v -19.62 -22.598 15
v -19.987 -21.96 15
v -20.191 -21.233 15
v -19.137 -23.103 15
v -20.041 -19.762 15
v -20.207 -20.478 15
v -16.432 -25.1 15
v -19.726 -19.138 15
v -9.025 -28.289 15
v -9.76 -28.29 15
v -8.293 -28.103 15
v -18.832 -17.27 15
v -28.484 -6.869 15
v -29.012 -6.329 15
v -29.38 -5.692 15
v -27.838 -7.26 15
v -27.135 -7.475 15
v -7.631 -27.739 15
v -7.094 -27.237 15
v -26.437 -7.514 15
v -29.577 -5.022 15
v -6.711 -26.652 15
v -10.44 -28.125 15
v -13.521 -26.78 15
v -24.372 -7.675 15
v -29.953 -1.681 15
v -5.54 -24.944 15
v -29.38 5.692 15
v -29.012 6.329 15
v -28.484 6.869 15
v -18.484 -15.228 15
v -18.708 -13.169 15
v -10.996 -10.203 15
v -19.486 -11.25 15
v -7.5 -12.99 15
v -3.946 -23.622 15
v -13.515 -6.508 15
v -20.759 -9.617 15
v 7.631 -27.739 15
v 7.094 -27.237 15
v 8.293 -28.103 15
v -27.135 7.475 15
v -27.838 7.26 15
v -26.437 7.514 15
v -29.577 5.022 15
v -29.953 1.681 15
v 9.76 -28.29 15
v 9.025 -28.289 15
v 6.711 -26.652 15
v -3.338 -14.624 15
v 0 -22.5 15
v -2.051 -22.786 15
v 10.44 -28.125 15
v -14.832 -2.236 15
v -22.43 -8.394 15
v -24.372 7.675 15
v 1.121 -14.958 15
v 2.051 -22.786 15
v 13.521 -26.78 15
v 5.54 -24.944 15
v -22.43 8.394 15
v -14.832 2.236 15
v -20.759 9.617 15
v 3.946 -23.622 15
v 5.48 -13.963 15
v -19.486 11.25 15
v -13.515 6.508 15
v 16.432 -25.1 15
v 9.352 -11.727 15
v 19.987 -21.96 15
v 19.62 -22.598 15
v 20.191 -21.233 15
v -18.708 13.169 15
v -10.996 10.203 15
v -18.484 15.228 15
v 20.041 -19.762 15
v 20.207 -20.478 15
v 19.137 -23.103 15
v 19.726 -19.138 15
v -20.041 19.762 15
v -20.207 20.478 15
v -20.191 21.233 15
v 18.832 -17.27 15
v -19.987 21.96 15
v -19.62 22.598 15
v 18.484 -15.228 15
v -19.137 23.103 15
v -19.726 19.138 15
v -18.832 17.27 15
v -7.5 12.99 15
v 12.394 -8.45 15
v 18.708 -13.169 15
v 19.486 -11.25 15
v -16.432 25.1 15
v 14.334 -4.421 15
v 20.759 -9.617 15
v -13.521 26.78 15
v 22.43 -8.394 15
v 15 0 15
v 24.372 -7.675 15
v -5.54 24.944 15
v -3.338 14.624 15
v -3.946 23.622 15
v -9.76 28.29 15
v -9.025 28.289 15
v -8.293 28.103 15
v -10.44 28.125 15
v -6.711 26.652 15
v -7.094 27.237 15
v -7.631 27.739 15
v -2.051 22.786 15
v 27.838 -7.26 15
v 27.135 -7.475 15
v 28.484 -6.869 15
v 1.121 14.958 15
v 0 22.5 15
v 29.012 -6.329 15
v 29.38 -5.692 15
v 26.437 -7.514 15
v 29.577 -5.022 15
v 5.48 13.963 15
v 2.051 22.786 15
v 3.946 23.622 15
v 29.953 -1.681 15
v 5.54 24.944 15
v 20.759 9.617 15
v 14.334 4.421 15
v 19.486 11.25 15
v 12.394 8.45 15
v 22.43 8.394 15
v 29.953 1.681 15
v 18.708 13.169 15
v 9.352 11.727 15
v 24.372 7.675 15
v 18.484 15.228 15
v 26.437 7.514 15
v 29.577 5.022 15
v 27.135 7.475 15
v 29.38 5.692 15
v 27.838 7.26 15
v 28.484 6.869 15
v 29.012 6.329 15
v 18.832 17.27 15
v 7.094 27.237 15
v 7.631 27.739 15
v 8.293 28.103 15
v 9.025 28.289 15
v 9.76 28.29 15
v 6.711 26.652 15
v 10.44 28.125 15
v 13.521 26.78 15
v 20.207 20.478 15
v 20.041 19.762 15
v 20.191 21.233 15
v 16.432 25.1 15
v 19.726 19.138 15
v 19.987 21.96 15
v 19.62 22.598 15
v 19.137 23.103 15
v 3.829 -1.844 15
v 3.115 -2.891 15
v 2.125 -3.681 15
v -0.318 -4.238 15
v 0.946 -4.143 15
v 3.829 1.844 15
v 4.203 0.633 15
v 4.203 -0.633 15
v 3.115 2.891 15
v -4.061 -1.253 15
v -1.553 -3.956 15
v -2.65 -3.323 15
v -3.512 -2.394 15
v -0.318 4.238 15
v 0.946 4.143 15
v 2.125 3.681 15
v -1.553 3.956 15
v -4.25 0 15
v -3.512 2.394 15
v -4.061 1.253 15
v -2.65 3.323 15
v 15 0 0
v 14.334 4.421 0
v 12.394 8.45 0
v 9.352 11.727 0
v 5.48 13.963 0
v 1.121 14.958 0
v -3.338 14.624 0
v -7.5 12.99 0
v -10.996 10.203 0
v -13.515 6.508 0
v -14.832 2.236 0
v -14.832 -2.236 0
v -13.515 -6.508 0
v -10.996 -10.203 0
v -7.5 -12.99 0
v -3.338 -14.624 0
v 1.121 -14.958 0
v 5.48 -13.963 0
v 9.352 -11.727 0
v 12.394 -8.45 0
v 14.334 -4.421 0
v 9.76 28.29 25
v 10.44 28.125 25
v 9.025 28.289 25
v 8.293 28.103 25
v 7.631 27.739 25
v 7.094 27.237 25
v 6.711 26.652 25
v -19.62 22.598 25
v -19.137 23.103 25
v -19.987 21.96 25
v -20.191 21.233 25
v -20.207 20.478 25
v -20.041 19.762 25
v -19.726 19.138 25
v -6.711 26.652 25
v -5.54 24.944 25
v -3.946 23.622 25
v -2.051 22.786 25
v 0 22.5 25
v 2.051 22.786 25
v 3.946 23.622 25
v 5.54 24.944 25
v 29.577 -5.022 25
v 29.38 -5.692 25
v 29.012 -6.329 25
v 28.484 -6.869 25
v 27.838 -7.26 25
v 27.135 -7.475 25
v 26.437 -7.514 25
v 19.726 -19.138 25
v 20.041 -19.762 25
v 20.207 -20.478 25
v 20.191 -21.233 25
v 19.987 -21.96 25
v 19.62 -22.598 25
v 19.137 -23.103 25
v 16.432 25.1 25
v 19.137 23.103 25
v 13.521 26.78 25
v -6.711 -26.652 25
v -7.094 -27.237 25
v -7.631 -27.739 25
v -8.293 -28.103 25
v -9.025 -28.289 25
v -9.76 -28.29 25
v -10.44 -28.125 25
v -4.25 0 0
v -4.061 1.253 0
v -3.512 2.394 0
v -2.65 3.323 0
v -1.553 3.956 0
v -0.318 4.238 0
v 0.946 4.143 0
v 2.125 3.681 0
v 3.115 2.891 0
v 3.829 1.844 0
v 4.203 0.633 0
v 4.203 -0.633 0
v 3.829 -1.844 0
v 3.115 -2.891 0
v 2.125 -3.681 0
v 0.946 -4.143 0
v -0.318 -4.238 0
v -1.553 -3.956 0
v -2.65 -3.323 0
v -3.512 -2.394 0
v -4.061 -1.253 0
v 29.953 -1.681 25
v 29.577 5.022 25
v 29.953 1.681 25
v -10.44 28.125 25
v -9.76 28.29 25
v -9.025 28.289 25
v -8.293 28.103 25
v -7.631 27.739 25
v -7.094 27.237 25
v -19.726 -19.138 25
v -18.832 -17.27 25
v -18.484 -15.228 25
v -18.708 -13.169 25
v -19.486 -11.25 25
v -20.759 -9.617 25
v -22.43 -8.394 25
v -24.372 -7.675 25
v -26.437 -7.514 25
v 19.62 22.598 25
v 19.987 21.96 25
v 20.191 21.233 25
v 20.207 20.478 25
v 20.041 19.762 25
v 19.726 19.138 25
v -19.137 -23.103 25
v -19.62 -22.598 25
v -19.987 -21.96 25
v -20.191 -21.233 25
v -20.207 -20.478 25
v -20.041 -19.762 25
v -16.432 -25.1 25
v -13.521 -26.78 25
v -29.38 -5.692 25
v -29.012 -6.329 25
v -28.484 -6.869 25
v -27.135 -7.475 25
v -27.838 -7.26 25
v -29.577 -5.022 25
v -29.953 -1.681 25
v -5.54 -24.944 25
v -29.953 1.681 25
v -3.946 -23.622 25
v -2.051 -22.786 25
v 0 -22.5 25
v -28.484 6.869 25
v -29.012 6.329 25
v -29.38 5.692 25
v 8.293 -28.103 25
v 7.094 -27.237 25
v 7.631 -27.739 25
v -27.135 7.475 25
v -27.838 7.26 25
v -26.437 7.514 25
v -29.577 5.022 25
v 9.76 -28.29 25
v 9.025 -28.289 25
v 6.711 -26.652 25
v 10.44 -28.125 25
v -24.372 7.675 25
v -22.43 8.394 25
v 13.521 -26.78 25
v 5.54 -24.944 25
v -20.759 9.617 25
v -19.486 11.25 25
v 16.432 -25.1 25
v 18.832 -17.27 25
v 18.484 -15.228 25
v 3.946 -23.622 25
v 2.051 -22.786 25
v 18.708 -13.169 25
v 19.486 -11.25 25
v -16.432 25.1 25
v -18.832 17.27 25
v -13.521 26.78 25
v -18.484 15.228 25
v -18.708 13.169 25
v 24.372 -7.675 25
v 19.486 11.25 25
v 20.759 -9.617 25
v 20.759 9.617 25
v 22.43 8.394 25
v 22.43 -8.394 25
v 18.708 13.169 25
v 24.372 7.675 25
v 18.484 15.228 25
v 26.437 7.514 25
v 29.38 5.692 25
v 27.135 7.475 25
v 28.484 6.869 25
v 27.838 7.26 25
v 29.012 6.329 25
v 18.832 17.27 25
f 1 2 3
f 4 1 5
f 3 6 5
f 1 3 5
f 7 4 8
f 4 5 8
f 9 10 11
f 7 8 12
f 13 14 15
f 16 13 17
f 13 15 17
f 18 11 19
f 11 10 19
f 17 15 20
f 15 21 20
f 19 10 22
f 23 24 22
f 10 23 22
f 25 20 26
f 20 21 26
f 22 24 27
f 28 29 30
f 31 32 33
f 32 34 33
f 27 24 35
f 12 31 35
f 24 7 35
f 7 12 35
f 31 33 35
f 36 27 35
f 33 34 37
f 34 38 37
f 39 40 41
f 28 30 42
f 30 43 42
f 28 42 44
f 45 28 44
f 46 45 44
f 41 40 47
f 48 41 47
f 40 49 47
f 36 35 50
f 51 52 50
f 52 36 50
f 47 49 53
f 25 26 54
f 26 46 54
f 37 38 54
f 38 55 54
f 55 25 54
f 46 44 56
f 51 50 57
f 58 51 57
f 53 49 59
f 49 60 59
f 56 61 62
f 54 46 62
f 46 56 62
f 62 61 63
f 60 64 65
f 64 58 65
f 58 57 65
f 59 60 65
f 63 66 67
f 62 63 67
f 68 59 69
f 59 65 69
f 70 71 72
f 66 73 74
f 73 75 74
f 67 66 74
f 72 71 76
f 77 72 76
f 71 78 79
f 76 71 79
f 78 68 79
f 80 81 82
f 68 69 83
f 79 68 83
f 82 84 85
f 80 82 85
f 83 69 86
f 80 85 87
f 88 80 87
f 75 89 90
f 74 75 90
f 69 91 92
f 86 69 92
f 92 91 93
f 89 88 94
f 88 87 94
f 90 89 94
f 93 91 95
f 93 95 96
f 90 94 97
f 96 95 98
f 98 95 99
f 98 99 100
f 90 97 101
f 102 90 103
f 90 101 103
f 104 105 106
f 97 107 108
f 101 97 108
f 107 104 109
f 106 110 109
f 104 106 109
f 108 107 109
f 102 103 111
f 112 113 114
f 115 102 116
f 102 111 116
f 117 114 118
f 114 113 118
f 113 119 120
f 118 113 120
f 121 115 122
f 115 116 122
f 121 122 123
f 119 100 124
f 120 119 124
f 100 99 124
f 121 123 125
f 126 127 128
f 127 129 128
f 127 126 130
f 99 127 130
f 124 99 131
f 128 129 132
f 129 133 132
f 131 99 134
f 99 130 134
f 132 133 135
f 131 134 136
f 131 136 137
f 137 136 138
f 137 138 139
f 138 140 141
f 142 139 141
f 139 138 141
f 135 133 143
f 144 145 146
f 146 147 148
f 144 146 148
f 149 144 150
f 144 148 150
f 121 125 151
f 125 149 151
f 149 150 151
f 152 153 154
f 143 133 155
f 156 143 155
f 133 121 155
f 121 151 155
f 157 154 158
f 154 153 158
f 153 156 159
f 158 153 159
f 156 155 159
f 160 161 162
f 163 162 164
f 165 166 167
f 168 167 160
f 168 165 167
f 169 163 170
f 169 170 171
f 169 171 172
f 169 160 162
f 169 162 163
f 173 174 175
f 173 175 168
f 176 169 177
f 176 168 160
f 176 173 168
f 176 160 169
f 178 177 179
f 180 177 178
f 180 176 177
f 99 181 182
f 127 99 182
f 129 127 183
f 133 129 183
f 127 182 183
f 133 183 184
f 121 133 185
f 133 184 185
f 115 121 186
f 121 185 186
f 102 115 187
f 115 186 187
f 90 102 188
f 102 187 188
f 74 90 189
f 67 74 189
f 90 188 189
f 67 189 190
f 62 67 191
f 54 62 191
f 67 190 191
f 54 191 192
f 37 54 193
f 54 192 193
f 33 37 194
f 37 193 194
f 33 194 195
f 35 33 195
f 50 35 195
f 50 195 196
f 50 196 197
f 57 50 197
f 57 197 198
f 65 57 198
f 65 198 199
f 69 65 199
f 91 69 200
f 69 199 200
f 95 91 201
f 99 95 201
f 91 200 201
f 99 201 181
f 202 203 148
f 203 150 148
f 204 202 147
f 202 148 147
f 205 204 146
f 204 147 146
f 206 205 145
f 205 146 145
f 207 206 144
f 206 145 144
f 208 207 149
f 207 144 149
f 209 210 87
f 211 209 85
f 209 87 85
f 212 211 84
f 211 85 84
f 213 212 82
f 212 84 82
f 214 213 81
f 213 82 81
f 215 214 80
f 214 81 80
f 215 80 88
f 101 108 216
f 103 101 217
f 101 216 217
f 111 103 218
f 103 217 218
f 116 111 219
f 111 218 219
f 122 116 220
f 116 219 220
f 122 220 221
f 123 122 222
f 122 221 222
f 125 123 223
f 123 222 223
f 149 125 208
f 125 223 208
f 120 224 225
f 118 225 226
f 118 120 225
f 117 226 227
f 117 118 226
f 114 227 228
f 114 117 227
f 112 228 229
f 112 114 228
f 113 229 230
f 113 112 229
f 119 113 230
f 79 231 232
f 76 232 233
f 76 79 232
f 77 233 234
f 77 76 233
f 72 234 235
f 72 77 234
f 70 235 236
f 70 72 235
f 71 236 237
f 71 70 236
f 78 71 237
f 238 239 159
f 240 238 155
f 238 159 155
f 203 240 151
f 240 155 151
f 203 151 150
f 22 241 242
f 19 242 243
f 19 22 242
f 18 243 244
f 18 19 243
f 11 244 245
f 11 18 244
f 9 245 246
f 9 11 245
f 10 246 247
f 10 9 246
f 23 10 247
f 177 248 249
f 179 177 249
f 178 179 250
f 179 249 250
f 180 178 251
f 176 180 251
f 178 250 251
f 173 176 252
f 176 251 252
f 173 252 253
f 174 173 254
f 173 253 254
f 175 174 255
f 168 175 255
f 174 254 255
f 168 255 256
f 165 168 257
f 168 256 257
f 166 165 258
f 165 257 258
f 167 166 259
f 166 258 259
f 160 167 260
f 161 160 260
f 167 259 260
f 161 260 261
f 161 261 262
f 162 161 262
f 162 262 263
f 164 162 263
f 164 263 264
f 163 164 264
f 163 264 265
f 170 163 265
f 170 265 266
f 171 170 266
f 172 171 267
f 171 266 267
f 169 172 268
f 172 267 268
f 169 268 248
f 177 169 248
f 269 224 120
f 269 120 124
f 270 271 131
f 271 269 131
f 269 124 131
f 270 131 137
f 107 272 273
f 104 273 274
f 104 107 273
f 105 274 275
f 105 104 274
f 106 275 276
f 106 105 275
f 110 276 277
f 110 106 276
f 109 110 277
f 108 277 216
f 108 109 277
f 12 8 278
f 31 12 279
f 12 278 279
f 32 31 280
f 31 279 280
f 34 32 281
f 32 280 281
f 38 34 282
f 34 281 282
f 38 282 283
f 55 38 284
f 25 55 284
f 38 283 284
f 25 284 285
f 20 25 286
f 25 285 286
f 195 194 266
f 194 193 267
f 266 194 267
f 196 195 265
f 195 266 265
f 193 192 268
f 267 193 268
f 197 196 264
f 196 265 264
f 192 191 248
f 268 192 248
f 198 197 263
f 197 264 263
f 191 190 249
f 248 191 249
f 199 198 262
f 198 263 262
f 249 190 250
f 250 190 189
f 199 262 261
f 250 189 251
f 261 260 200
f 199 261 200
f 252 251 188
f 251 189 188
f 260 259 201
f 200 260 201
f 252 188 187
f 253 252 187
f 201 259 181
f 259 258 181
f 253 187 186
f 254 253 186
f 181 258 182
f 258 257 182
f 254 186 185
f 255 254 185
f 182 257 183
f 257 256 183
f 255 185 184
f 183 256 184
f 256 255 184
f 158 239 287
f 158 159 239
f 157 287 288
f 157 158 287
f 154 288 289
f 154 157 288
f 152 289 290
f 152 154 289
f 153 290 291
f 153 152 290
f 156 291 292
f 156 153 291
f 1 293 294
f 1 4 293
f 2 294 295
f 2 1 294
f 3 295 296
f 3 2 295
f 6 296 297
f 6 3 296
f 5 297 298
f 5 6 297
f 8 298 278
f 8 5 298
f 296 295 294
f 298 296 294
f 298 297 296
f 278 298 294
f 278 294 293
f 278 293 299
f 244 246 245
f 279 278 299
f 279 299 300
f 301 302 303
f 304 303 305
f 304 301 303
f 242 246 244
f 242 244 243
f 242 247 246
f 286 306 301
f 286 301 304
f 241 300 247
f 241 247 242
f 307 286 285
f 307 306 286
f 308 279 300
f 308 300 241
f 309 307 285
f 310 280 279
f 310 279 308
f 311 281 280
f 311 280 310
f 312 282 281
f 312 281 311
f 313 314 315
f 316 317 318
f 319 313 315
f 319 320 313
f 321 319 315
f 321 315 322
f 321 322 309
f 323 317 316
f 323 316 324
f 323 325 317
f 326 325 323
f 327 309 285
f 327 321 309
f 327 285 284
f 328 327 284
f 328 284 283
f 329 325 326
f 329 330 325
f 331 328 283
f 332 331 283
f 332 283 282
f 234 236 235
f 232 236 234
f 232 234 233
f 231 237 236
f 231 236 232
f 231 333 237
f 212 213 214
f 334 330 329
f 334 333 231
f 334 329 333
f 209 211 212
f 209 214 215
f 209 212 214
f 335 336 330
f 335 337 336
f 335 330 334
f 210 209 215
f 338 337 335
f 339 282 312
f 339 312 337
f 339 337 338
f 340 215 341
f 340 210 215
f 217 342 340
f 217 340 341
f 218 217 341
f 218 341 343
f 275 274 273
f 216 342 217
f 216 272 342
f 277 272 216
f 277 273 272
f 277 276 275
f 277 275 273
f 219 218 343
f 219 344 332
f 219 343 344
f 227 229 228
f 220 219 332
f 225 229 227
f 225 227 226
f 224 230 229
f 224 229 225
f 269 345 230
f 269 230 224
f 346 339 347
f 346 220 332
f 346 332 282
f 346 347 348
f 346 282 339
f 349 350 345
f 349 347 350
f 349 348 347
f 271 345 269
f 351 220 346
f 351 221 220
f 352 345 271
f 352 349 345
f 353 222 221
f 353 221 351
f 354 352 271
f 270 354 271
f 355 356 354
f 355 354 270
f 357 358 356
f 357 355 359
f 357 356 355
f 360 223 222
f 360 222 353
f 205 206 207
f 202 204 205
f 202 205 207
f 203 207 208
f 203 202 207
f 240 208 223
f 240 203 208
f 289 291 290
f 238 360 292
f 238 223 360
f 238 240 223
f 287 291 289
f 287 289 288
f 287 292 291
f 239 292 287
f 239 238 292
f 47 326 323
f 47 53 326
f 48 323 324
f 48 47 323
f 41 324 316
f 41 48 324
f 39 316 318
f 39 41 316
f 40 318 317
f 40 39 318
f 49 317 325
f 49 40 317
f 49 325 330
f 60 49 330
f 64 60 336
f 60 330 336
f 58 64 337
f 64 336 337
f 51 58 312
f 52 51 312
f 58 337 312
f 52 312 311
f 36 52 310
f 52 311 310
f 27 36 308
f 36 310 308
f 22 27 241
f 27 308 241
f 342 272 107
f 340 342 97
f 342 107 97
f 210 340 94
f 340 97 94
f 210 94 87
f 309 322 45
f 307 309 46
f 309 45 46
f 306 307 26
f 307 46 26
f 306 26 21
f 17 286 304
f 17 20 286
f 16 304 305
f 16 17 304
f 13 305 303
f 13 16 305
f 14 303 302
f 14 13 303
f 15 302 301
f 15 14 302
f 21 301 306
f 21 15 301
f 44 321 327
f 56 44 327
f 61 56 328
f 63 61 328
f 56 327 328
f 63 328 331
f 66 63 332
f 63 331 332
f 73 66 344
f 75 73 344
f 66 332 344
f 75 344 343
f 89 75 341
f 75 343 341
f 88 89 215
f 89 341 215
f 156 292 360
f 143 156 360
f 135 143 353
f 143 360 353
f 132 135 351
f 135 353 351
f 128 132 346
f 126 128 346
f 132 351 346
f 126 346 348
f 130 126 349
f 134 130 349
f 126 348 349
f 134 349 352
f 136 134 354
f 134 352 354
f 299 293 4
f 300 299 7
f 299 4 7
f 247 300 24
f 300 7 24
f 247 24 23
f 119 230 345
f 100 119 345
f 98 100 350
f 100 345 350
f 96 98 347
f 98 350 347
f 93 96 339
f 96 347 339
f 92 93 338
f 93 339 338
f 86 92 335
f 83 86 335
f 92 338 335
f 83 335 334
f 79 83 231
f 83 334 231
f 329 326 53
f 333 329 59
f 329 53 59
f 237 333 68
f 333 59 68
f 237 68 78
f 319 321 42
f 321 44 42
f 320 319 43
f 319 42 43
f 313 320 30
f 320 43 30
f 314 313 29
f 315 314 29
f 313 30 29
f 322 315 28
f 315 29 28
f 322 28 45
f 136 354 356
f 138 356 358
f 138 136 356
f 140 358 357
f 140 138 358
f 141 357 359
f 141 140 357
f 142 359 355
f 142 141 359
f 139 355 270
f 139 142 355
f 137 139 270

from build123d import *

# Parameters (mm, degrees)
IZIM1_R                        = 15
Y_KSEKLIK_EKSTR_ZYON1_DEPTH    = 15
IZIM2_R                        = 30
Y_KSEKLIK_EKSTR_ZYON2_DEPTH    = 10
IZIM3_R                        = 7.5
KES_EKSTR_ZYON1_DEPTH          = 10
RADYUS1_R                      = 3
DAIRESEL_KAPLAMA3_COUNT        = 6
RADYUS1_OF_DAIRESEL_KAPLAMA3_R = 3
IZIM4_R                        = 4.25
KES_EKSTR_ZYON2_DEPTH          = 15


with BuildPart() as part:
    # Çizim1 → Yükseklik-Ekstrüzyon1 (new body)
    with BuildSketch(Plane.XY):
        Circle(IZIM1_R)
    extrude(amount=Y_KSEKLIK_EKSTR_ZYON1_DEPTH)

    # Çizim2 → Yükseklik-Ekstrüzyon2 (add)
    with BuildSketch(Plane.XY.offset(15)):
        Circle(IZIM2_R)
    extrude(amount=Y_KSEKLIK_EKSTR_ZYON2_DEPTH)

    # Çizim3 → Kes-Ekstrüzyon1 (cut)
    with BuildSketch(Plane.XY.offset(25)):
        with Locations((0, 30)):
            Circle(IZIM3_R)
    kes_ekstr_zyon1 = extrude(amount=-KES_EKSTR_ZYON1_DEPTH, mode=Mode.SUBTRACT)

    # Radyus1
    radyus1_edges = [part.edges().sort_by_distance(p)[0] for p in [
        (7.441175562, 29.0625, 20),
        (-7.441175562, 29.0625, 20),
    ]]
    fillet(radyus1_edges, radius=RADYUS1_R)

    # Dairesel Kaplama3: Kes-Ekstrüzyon1 ×6 about axis
    dairesel_kaplama3_axis = Axis((0, 0, 0), (0, 0, 1))
    for i in range(1, DAIRESEL_KAPLAMA3_COUNT):
        add(kes_ekstr_zyon1.rotate(dairesel_kaplama3_axis, i * 360 / DAIRESEL_KAPLAMA3_COUNT), mode=Mode.SUBTRACT)

    # Radyus1 of Dairesel Kaplama3
    radyus1_of_dairesel_kaplama3_edges = [part.edges().sort_by_distance(p)[0] for p in [
        (-21.448275516, 20.975497071, 20),
        (-28.889451079, 8.087002929, 20),
        (-28.889451079, -8.087002929, 20),
        (-21.448275516, -20.975497071, 20),
        (-7.441175562, -29.0625, 20),
        (7.441175562, -29.0625, 20),
        (21.448275516, -20.975497071, 20),
        (28.889451079, -8.087002929, 20),
        (28.889451079, 8.087002929, 20),
        (21.448275516, 20.975497071, 20),
    ]]
    fillet(radyus1_of_dairesel_kaplama3_edges, radius=RADYUS1_OF_DAIRESEL_KAPLAMA3_R)

    # Çizim4 → Kes-Ekstrüzyon2 (cut)
    with BuildSketch(Plane(origin=(0, 0, 0), x_dir=(-1, 0, 0), z_dir=(0, 0, -1))):
        Circle(IZIM4_R)
    extrude(amount=-KES_EKSTR_ZYON2_DEPTH, mode=Mode.SUBTRACT)


solid = part.part
